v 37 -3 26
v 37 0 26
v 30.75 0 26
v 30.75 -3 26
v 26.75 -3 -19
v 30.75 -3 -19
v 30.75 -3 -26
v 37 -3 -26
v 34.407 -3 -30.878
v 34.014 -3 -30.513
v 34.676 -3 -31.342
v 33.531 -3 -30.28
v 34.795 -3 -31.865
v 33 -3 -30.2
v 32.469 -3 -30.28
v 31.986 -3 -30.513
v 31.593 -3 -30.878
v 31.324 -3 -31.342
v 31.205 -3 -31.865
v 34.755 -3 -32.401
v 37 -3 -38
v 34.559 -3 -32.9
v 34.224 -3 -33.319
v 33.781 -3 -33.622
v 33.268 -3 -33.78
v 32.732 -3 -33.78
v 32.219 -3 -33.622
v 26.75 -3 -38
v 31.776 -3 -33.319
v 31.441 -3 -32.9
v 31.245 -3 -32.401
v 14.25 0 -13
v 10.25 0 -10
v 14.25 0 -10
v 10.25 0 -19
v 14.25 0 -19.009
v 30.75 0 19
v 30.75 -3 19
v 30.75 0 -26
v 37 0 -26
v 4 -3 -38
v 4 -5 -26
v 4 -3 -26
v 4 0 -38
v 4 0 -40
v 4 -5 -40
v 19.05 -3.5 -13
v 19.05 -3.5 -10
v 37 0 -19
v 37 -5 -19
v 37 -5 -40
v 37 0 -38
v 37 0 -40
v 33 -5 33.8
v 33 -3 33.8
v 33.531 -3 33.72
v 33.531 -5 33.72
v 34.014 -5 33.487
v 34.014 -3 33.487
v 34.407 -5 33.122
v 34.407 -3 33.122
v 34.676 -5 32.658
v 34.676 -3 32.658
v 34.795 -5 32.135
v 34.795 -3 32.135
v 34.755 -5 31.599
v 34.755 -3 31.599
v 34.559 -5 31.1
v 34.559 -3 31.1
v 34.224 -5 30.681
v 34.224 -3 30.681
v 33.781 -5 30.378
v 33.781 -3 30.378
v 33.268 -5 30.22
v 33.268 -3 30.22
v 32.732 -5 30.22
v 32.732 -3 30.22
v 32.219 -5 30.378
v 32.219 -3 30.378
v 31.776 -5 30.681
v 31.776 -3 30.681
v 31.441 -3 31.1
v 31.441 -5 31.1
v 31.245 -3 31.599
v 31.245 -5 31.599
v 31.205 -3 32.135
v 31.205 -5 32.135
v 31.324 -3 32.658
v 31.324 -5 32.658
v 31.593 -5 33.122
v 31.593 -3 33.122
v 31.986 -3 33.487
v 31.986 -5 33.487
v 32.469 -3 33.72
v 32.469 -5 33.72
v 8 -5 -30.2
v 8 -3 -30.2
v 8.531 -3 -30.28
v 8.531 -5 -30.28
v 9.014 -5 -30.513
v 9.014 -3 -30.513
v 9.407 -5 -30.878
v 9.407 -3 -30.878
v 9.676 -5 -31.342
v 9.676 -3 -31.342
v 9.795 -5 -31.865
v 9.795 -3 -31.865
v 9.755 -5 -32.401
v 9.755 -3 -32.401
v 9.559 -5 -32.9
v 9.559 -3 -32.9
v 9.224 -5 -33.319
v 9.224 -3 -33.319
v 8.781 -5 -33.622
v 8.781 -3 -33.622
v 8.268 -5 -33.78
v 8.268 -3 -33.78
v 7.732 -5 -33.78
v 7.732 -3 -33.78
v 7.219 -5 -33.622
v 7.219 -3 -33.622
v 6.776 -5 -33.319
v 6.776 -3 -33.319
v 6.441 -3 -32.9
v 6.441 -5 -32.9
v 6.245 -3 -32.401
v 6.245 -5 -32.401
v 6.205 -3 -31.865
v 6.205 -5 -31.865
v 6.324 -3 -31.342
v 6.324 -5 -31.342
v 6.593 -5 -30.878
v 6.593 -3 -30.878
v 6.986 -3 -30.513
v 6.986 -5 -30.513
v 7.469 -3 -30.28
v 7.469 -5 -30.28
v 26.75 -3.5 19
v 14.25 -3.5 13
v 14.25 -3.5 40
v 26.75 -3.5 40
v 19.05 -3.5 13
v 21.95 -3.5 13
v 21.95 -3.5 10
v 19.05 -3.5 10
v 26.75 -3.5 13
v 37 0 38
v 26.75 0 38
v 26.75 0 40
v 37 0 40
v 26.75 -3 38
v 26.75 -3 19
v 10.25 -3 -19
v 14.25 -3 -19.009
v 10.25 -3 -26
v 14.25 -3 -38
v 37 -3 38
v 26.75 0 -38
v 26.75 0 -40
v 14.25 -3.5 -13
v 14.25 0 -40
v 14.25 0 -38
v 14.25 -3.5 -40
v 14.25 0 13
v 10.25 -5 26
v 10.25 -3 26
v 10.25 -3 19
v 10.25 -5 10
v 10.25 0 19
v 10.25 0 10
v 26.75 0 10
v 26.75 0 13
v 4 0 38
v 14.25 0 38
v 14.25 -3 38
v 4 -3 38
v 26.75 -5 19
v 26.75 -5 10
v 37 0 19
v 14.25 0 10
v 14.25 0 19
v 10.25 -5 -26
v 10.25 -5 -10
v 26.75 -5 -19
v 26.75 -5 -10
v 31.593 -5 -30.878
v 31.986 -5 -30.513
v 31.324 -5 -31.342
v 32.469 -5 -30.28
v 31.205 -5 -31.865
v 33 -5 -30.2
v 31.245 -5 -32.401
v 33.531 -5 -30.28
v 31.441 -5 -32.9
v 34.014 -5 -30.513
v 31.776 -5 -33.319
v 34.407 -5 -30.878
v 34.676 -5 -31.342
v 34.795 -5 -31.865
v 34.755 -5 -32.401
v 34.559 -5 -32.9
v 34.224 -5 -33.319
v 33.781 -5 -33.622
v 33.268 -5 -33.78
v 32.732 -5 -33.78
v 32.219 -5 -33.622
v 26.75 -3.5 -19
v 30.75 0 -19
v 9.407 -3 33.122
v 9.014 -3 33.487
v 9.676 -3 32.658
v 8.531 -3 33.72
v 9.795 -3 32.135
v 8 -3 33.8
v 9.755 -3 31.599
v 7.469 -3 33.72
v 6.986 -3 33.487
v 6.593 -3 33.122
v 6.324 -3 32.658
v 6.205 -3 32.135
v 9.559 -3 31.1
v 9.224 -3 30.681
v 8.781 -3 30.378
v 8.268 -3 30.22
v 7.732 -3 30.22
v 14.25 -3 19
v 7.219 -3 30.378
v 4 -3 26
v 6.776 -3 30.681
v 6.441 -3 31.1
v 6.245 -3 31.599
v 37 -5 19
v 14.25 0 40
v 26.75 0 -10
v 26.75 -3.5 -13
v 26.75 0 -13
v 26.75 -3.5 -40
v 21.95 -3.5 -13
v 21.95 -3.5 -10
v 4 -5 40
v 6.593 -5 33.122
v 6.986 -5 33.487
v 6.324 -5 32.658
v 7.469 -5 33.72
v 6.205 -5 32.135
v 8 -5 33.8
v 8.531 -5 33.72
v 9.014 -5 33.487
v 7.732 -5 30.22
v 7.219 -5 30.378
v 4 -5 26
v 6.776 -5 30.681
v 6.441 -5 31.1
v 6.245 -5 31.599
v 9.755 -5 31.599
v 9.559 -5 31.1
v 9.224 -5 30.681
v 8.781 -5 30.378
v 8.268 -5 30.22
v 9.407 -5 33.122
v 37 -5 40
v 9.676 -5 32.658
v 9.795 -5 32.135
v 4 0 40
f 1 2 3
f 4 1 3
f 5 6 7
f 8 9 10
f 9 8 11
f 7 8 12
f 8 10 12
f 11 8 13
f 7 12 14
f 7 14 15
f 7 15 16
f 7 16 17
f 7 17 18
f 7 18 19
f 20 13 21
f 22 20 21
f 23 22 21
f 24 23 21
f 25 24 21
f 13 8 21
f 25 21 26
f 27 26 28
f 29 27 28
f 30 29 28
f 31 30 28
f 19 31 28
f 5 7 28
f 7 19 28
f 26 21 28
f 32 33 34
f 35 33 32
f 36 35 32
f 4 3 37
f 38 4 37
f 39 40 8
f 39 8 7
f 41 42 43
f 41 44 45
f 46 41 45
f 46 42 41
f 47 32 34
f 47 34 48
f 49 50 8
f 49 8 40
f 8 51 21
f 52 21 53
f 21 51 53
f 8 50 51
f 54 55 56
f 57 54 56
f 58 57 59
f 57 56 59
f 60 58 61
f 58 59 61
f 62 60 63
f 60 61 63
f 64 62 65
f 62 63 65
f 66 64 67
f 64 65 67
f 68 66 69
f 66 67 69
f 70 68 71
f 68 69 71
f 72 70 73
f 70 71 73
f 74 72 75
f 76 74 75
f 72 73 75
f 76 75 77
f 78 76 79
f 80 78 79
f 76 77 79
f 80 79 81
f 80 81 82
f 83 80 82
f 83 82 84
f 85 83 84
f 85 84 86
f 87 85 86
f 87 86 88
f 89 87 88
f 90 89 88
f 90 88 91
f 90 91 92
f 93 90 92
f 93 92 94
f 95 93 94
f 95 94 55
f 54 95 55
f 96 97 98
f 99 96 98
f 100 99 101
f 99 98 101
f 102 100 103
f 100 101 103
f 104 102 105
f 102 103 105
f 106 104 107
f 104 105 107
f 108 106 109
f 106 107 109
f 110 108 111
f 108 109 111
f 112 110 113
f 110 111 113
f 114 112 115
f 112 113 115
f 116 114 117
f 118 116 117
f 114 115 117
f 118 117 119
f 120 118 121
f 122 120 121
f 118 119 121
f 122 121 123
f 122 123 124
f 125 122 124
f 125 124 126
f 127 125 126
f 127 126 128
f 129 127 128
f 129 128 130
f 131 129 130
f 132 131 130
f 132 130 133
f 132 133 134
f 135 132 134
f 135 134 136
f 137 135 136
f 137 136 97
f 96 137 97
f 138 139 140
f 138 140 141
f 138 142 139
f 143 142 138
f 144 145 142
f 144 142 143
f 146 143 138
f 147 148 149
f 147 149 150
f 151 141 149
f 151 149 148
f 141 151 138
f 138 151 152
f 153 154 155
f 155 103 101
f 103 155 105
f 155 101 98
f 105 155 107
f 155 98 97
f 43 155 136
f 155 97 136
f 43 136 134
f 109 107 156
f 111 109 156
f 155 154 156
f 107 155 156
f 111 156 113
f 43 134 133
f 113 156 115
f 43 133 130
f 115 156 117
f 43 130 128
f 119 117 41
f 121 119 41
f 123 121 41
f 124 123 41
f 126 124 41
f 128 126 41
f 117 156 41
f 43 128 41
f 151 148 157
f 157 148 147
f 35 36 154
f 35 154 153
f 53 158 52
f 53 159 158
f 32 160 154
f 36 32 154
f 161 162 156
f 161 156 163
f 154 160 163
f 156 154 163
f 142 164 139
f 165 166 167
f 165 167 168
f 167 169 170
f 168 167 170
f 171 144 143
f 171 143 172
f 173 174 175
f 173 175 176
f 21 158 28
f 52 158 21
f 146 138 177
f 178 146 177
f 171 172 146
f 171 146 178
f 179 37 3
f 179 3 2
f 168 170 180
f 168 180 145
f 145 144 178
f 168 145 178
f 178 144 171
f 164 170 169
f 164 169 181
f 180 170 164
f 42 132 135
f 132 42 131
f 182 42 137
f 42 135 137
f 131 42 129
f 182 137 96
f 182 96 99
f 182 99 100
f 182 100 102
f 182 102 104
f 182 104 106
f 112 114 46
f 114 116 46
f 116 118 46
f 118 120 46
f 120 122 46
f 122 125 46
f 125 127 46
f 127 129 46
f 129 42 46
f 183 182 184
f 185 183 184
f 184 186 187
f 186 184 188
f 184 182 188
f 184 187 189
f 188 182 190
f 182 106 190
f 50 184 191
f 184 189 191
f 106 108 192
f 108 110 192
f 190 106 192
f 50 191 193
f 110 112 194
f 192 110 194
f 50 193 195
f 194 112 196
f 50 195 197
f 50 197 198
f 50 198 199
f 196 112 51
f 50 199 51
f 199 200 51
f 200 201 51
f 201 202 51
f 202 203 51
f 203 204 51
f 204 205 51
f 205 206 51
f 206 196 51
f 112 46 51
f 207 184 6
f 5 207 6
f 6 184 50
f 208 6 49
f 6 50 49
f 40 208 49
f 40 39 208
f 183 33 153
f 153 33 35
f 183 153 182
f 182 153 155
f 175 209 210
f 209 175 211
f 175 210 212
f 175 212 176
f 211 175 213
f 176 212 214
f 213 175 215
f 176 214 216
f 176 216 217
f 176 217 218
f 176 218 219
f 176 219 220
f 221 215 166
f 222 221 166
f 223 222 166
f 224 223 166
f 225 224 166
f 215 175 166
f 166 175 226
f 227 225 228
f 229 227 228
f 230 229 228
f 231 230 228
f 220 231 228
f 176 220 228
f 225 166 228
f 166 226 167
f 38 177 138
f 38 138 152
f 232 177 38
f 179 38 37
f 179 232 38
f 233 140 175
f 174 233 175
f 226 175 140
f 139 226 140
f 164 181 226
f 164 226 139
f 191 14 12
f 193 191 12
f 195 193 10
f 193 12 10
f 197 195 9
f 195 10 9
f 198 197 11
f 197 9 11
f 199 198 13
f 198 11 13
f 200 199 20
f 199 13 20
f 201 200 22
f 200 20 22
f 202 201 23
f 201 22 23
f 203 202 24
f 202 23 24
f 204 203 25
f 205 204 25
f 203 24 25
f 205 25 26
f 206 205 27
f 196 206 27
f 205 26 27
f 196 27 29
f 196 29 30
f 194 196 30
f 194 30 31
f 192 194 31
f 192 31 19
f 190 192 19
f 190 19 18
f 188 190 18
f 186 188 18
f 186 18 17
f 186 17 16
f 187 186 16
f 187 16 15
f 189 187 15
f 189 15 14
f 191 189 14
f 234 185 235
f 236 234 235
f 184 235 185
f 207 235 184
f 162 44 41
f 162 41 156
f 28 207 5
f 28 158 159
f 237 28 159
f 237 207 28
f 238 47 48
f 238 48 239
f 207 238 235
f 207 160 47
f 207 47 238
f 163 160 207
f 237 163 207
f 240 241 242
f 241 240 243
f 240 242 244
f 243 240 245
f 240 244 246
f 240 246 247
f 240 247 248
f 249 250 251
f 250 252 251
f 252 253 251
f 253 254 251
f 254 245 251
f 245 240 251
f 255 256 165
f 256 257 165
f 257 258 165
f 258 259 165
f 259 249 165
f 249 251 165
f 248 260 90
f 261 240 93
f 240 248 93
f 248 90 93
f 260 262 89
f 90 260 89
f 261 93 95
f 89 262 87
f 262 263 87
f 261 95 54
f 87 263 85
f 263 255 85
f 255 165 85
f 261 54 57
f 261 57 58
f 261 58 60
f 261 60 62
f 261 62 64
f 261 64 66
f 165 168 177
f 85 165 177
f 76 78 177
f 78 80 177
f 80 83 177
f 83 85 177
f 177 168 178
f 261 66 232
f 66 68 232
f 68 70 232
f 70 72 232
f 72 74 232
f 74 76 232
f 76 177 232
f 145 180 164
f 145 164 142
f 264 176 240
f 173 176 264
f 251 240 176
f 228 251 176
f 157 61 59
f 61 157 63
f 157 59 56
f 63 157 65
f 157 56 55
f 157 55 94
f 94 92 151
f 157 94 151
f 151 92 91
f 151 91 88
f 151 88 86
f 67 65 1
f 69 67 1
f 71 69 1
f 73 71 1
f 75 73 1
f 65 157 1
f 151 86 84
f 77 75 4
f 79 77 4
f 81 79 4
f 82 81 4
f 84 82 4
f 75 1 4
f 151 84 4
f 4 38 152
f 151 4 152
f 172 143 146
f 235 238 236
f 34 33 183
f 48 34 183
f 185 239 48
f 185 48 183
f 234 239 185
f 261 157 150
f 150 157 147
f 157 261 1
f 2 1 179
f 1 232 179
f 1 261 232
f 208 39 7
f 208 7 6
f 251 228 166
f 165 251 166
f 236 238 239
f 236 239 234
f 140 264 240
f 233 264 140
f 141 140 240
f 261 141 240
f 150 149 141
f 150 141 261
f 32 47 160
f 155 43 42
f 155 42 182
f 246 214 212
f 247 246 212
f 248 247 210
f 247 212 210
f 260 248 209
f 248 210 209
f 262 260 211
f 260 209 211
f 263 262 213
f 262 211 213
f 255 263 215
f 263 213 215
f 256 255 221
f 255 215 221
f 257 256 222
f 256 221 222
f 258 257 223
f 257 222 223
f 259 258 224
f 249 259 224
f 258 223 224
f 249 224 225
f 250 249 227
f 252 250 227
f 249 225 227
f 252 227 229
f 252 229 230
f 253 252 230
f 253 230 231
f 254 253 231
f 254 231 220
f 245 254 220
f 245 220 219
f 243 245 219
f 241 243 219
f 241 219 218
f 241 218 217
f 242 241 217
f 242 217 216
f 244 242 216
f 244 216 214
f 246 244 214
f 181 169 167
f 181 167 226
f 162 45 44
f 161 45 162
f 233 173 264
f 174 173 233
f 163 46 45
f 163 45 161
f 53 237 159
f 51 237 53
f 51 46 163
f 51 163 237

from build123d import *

# Parameters (mm, degrees)
SKETCH1_W                                = 33
SKETCH1_H                                = 30
BOSS_EXTRUDE4_DEPTH                      = 3
SKETCH13_W                               = 10.25
SKETCH13_H                               = 30
BOSS_EXTRUDE5_DEPTH                      = 2
SKETCH14_W                               = 12.5
SKETCH14_H                               = 30
CUT_EXTRUDE7_DEPTH                       = 1.5
BOSS_EXTRUDE6_DEPTH                      = 3
CUT_EXTRUDE12_REACH                      = 56.717
SKETCH25_W                               = 6.25
SKETCH25_H                               = 16
BOSS_EXTRUDE7_DEPTH                      = 23
SKETCH27_W                               = 33
SKETCH27_H                               = 5
BOSS_EXTRUDE8_DEPTH                      = 27
CUT_EXTRUDE13_REACH                      = 56.717
SKETCH28_W                               = 6.25
SKETCH28_H                               = 13
CUT_EXTRUDE16_REACH                      = 56.717
SKETCH29_W                               = 26.75
SKETCH29_H                               = 20
SKETCH30_W                               = 12.5
SKETCH30_H                               = 27
CUT_EXTRUDE17_DEPTH                      = 1.5
CUT_EXTRUDE18_DEPTH                      = 3
CUT_EXTRUDE19_DEPTH                      = 3
SKETCH33_R                               = 1.8
CUT_EXTRUDE20_DEPTH                      = 8
CBORE_START                              = -2.4
CBORE_FOR_M3_PAN_HEAD_SCREW1_OUTLINE_R   = 3.5
CBORE_FOR_M3_PAN_HEAD_SCREW1_DEPTH       = 2.4
CBORE_START_2                            = -5
CBORE_FOR_M3_PAN_HEAD_SCREW1_2_OUTLINE_R = 1.8
CBORE_FOR_M3_PAN_HEAD_SCREW1_2_DEPTH     = 2.6
CUT_EXTRUDE22_DEPTH                      = 1.5
SKETCH39_W                               = 12.5
SKETCH39_H                               = 27
CUT_EXTRUDE24_DEPTH                      = 0.5
SKETCH40_W                               = 9
SKETCH40_H                               = 5
CUT_EXTRUDE26_DEPTH                      = 10.25
SKETCH41_W                               = 9
SKETCH41_H                               = 5
CUT_EXTRUDE27_DEPTH                      = 10.25


# Read off the part's stored shape, not the designer's step: CBORE for M3 Pan Head Screw1
with BuildPart() as part:
    # Sketch1 → Boss-Extrude4 (new body)
    with BuildSketch(Plane(origin=(0, -2, 0), x_dir=(1, 0, 0), z_dir=(0, 1, 0))):
        with Locations((20.5, 25)):
            Rectangle(SKETCH1_W, SKETCH1_H)
    extrude(amount=-BOSS_EXTRUDE4_DEPTH)

    # Sketch13 → Boss-Extrude5 (add)
    with BuildSketch(Plane(origin=(0, -2, 0), x_dir=(1, 0, 0), z_dir=(0, 1, 0))):
        with Locations((9.125, 25)):
            Rectangle(SKETCH13_W, SKETCH13_H)
        with Locations((31.875, 25)):
            Rectangle(SKETCH13_W, SKETCH13_H)
    extrude(amount=BOSS_EXTRUDE5_DEPTH)

    # Sketch14 → Cut-Extrude7 (cut)
    with BuildSketch(Plane(origin=(0, -2, 0), x_dir=(1, 0, 0), z_dir=(0, 1, 0))):
        with Locations((20.5, 25)):
            Rectangle(SKETCH14_W, SKETCH14_H)
    extrude(amount=-CUT_EXTRUDE7_DEPTH, mode=Mode.SUBTRACT)

    # Sketch19 → Boss-Extrude6 (add)
    with BuildSketch(Plane.XY.offset(-10)):
        Polygon((14.25, 0), (19.05, -3.5), (14.25, -3.5), align=None)
    boss_extrude6 = extrude(amount=-BOSS_EXTRUDE6_DEPTH)

    # Mirror3: Boss-Extrude6 across plane
    add(boss_extrude6.mirror(Plane(origin=(20.5, 0, 0), x_dir=(0, 0, 1), z_dir=(1, 0, 0))))

    # Sketch25 → Cut-Extrude12 (cut, up to next)
    with BuildSketch(Plane(origin=(0, 0, 0), x_dir=(1, 0, 0), z_dir=(0, 1, 0)), mode=Mode.PRIVATE) as cut_extrude12_sk1:
        with Locations((7.125, 18)):
            Rectangle(SKETCH25_W, SKETCH25_H)
    cut_extrude12_tool1 = extrude(cut_extrude12_sk1.sketch, amount=-CUT_EXTRUDE12_REACH, mode=Mode.PRIVATE) & part.part
    add(cut_extrude12_tool1.solids().sort_by_distance((7.125, 0, -18))[0], mode=Mode.SUBTRACT)

    # Sketch26 → Boss-Extrude7 (add)
    with BuildSketch(Plane.XY.offset(-10)):
        Polygon((10.25, -5), (10.25, 0), (14.25, 0), (19.05, -3.5), (21.95, -3.5), (26.75, 0), (37, 0), (37, -5), align=None)
    extrude(amount=BOSS_EXTRUDE7_DEPTH)

    # Sketch27 → Boss-Extrude8 (add)
    with BuildSketch(Plane.XY.offset(13)):
        with Locations((20.5, -2.5)):
            Rectangle(SKETCH27_W, SKETCH27_H)
    extrude(amount=BOSS_EXTRUDE8_DEPTH)

    # Sketch28 → Cut-Extrude13 (cut, up to next)
    with BuildSketch(Plane(origin=(0, 0, 0), x_dir=(1, 0, 0), z_dir=(0, 1, 0)), mode=Mode.PRIVATE) as cut_extrude13_sk1:
        with Locations((7.125, -19.5)):
            Rectangle(SKETCH28_W, SKETCH28_H)
    cut_extrude13_tool1 = extrude(cut_extrude13_sk1.sketch, amount=-CUT_EXTRUDE13_REACH, mode=Mode.PRIVATE) & part.part
    add(cut_extrude13_tool1.solids().sort_by_distance((7.125, 0, 19.5))[0], mode=Mode.SUBTRACT)

    # Sketch29 → Cut-Extrude16 (cut, up to next)
    with BuildSketch(Plane(origin=(0, 0, 0), x_dir=(1, 0, 0), z_dir=(0, 1, 0)), mode=Mode.PRIVATE) as cut_extrude16_sk1:
        with Locations((23.625, 0)):
            Rectangle(SKETCH29_W, SKETCH29_H)
    cut_extrude16_tool1 = extrude(cut_extrude16_sk1.sketch, amount=-CUT_EXTRUDE16_REACH, mode=Mode.PRIVATE) & part.part
    add(cut_extrude16_tool1.solids().sort_by_distance((23.625, 0, 0))[0], mode=Mode.SUBTRACT)


with BuildPart() as cut_extrude16_piece_1:
    # of the separate pieces the step leaves, piece 1, a body of its own (cut_extrude16_pieces)
    add(part.part.solids().sort_by_distance((10.25, -5, 26))[0])

    # Sketch30 → Cut-Extrude17 (cut)
    with BuildSketch(Plane(origin=(0, 0, 0), x_dir=(1, 0, 0), z_dir=(0, 1, 0))):
        with Locations((20.5, -26.5)):
            Rectangle(SKETCH30_W, SKETCH30_H)
    extrude(amount=-CUT_EXTRUDE17_DEPTH, mode=Mode.SUBTRACT)

    # Sketch32 → Cut-Extrude19 (cut)
    with BuildSketch(Plane(origin=(0, 0, 0), x_dir=(1, 0, 0), z_dir=(0, 1, 0))):
        Polygon((4, -26), (10.25, -26), (10.25, -19), (14.25, -19), (14.25, -38), (4, -38), align=None)
        Polygon((37, -38), (37, -26), (30.75, -26), (30.75, -19), (26.75, -19), (26.75, -38), align=None)
    extrude(amount=-CUT_EXTRUDE19_DEPTH, mode=Mode.SUBTRACT)


with BuildPart() as cut_extrude16_piece_2:
    # of the separate pieces the step leaves, piece 2, a body of its own (cut_extrude16_pieces)
    add(part.part.solids().sort_by_distance((4, -5, -40))[0])

    # Sketch31 → Cut-Extrude18 (cut)
    with BuildSketch(Plane(origin=(0, 0, 0), x_dir=(1, 0, 0), z_dir=(0, 1, 0))):
        Polygon((4, 38), (14.25, 38), (14.25, 19.008507387), (10.25, 19), (10.25, 26), (4, 26), align=None)
        Polygon((30.75, 19), (26.75, 19), (26.75, 38), (37, 38), (37, 26), (30.75, 26), align=None)
    extrude(amount=-CUT_EXTRUDE18_DEPTH, mode=Mode.SUBTRACT)


with BuildPart() as cut_extrude20_tool:
    # Sketch33 → Cut-Extrude20 (new body)
    with BuildSketch(Plane(origin=(0, 0, 0), x_dir=(1, 0, 0), z_dir=(0, 1, 0))):
        with Locations(Location((8, 32, 0), (0, 0, 270))):
            Circle(SKETCH33_R)
        with Locations(Location((33, 32, 0), (0, 0, 270))):
            Circle(SKETCH33_R)
        with Locations(Location((33, -32, 0), (0, 0, 270))):
            Circle(SKETCH33_R)
        with Locations(Location((8, -32, 0), (0, 0, 270))):
            Circle(SKETCH33_R)
    extrude(amount=-CUT_EXTRUDE20_DEPTH)


with BuildPart() as cut_extrude16_piece_1_1:
    add(cut_extrude16_piece_1.part)

    # Cut-Extrude20: cut by cut_extrude20_tool
    add(cut_extrude20_tool.part, mode=Mode.SUBTRACT)


with BuildPart() as cut_extrude16_piece_2_1:
    add(cut_extrude16_piece_2.part)

    # Cut-Extrude20: cut by cut_extrude20_tool
    add(cut_extrude20_tool.part, mode=Mode.SUBTRACT)


with BuildPart() as cbore_for_m3_pan_head_screw1_tool:
    # CBORE for M3 Pan Head Screw1 outline → CBORE for M3 Pan Head Screw1 (new body)
    with BuildSketch(Plane(origin=(0, 0, 0), x_dir=(1, 0, 0), z_dir=(0, 1, 0)).offset(CBORE_START)):
        with Locations((32, -14.75)):
            Circle(CBORE_FOR_M3_PAN_HEAD_SCREW1_OUTLINE_R)
        with Locations((32, 14.75)):
            Circle(CBORE_FOR_M3_PAN_HEAD_SCREW1_OUTLINE_R)
    extrude(amount=CBORE_FOR_M3_PAN_HEAD_SCREW1_DEPTH)


with BuildPart() as cut_extrude16_piece_1_2:
    add(cut_extrude16_piece_1_1.part)

    # CBORE for M3 Pan Head Screw1: cut by cbore_for_m3_pan_head_screw1_tool
    add(cbore_for_m3_pan_head_screw1_tool.part, mode=Mode.SUBTRACT)


with BuildPart() as cut_extrude16_piece_2_2:
    add(cut_extrude16_piece_2_1.part)

    # CBORE for M3 Pan Head Screw1: cut by cbore_for_m3_pan_head_screw1_tool
    add(cbore_for_m3_pan_head_screw1_tool.part, mode=Mode.SUBTRACT)


with BuildPart() as cbore_for_m3_pan_head_screw1_2_tool:
    # CBORE for M3 Pan Head Screw1 2 outline → CBORE for M3 Pan Head Screw1 2 (new body)
    with BuildSketch(Plane(origin=(0, 0, 0), x_dir=(1, 0, 0), z_dir=(0, 1, 0)).offset(CBORE_START_2)):
        with Locations((32, -14.75)):
            Circle(CBORE_FOR_M3_PAN_HEAD_SCREW1_2_OUTLINE_R)
        with Locations((32, 14.75)):
            Circle(CBORE_FOR_M3_PAN_HEAD_SCREW1_2_OUTLINE_R)
    extrude(amount=CBORE_FOR_M3_PAN_HEAD_SCREW1_2_DEPTH)


with BuildPart() as cut_extrude16_piece_1_3:
    add(cut_extrude16_piece_1_2.part)

    # CBORE for M3 Pan Head Screw1 2: cut by cbore_for_m3_pan_head_screw1_2_tool
    add(cbore_for_m3_pan_head_screw1_2_tool.part, mode=Mode.SUBTRACT)

    # Sketch36 → Cut-Extrude22 (cut)
    with BuildSketch(Plane(origin=(0, -1.5, 0), x_dir=(1, 0, 0), z_dir=(0, 1, 0))):
        Polygon((26.75, -13), (26.75, -38), (26.75, -40), (14.25, -40), (14.25, -38), (14.25, -13), (19.05, -13), (19.05, -10), (21.95, -10), (21.95, -13), align=None)
    extrude(amount=-CUT_EXTRUDE22_DEPTH, mode=Mode.SUBTRACT)

    # Sketch39 → Cut-Extrude24 (cut)
    with BuildSketch(Plane(origin=(0, -3, 0), x_dir=(1, 0, 0), z_dir=(0, 1, 0))):
        with Locations((20.5, -26.5)):
            Rectangle(SKETCH39_W, SKETCH39_H)
    extrude(amount=-CUT_EXTRUDE24_DEPTH, mode=Mode.SUBTRACT)

    # Sketch40 → Cut-Extrude26 (cut)
    with BuildSketch(Plane(origin=(37, 0, 0), x_dir=(0, 0, -1), z_dir=(1, 0, 0))):
        with Locations((-14.5, -2.5)):
            Rectangle(SKETCH40_W, SKETCH40_H)
    extrude(amount=-CUT_EXTRUDE26_DEPTH, mode=Mode.SUBTRACT)


with BuildPart() as cut_extrude16_piece_2_3:
    add(cut_extrude16_piece_2_2.part)

    # CBORE for M3 Pan Head Screw1 2: cut by cbore_for_m3_pan_head_screw1_2_tool
    add(cbore_for_m3_pan_head_screw1_2_tool.part, mode=Mode.SUBTRACT)

    # Sketch41 → Cut-Extrude27 (cut)
    with BuildSketch(Plane(origin=(37, 0, 0), x_dir=(0, 0, -1), z_dir=(1, 0, 0))):
        with Locations((14.5, -2.5)):
            Rectangle(SKETCH41_W, SKETCH41_H)
    extrude(amount=-CUT_EXTRUDE27_DEPTH, mode=Mode.SUBTRACT)


solid = Compound([cut_extrude16_piece_1_3.part, cut_extrude16_piece_2_3.part])
